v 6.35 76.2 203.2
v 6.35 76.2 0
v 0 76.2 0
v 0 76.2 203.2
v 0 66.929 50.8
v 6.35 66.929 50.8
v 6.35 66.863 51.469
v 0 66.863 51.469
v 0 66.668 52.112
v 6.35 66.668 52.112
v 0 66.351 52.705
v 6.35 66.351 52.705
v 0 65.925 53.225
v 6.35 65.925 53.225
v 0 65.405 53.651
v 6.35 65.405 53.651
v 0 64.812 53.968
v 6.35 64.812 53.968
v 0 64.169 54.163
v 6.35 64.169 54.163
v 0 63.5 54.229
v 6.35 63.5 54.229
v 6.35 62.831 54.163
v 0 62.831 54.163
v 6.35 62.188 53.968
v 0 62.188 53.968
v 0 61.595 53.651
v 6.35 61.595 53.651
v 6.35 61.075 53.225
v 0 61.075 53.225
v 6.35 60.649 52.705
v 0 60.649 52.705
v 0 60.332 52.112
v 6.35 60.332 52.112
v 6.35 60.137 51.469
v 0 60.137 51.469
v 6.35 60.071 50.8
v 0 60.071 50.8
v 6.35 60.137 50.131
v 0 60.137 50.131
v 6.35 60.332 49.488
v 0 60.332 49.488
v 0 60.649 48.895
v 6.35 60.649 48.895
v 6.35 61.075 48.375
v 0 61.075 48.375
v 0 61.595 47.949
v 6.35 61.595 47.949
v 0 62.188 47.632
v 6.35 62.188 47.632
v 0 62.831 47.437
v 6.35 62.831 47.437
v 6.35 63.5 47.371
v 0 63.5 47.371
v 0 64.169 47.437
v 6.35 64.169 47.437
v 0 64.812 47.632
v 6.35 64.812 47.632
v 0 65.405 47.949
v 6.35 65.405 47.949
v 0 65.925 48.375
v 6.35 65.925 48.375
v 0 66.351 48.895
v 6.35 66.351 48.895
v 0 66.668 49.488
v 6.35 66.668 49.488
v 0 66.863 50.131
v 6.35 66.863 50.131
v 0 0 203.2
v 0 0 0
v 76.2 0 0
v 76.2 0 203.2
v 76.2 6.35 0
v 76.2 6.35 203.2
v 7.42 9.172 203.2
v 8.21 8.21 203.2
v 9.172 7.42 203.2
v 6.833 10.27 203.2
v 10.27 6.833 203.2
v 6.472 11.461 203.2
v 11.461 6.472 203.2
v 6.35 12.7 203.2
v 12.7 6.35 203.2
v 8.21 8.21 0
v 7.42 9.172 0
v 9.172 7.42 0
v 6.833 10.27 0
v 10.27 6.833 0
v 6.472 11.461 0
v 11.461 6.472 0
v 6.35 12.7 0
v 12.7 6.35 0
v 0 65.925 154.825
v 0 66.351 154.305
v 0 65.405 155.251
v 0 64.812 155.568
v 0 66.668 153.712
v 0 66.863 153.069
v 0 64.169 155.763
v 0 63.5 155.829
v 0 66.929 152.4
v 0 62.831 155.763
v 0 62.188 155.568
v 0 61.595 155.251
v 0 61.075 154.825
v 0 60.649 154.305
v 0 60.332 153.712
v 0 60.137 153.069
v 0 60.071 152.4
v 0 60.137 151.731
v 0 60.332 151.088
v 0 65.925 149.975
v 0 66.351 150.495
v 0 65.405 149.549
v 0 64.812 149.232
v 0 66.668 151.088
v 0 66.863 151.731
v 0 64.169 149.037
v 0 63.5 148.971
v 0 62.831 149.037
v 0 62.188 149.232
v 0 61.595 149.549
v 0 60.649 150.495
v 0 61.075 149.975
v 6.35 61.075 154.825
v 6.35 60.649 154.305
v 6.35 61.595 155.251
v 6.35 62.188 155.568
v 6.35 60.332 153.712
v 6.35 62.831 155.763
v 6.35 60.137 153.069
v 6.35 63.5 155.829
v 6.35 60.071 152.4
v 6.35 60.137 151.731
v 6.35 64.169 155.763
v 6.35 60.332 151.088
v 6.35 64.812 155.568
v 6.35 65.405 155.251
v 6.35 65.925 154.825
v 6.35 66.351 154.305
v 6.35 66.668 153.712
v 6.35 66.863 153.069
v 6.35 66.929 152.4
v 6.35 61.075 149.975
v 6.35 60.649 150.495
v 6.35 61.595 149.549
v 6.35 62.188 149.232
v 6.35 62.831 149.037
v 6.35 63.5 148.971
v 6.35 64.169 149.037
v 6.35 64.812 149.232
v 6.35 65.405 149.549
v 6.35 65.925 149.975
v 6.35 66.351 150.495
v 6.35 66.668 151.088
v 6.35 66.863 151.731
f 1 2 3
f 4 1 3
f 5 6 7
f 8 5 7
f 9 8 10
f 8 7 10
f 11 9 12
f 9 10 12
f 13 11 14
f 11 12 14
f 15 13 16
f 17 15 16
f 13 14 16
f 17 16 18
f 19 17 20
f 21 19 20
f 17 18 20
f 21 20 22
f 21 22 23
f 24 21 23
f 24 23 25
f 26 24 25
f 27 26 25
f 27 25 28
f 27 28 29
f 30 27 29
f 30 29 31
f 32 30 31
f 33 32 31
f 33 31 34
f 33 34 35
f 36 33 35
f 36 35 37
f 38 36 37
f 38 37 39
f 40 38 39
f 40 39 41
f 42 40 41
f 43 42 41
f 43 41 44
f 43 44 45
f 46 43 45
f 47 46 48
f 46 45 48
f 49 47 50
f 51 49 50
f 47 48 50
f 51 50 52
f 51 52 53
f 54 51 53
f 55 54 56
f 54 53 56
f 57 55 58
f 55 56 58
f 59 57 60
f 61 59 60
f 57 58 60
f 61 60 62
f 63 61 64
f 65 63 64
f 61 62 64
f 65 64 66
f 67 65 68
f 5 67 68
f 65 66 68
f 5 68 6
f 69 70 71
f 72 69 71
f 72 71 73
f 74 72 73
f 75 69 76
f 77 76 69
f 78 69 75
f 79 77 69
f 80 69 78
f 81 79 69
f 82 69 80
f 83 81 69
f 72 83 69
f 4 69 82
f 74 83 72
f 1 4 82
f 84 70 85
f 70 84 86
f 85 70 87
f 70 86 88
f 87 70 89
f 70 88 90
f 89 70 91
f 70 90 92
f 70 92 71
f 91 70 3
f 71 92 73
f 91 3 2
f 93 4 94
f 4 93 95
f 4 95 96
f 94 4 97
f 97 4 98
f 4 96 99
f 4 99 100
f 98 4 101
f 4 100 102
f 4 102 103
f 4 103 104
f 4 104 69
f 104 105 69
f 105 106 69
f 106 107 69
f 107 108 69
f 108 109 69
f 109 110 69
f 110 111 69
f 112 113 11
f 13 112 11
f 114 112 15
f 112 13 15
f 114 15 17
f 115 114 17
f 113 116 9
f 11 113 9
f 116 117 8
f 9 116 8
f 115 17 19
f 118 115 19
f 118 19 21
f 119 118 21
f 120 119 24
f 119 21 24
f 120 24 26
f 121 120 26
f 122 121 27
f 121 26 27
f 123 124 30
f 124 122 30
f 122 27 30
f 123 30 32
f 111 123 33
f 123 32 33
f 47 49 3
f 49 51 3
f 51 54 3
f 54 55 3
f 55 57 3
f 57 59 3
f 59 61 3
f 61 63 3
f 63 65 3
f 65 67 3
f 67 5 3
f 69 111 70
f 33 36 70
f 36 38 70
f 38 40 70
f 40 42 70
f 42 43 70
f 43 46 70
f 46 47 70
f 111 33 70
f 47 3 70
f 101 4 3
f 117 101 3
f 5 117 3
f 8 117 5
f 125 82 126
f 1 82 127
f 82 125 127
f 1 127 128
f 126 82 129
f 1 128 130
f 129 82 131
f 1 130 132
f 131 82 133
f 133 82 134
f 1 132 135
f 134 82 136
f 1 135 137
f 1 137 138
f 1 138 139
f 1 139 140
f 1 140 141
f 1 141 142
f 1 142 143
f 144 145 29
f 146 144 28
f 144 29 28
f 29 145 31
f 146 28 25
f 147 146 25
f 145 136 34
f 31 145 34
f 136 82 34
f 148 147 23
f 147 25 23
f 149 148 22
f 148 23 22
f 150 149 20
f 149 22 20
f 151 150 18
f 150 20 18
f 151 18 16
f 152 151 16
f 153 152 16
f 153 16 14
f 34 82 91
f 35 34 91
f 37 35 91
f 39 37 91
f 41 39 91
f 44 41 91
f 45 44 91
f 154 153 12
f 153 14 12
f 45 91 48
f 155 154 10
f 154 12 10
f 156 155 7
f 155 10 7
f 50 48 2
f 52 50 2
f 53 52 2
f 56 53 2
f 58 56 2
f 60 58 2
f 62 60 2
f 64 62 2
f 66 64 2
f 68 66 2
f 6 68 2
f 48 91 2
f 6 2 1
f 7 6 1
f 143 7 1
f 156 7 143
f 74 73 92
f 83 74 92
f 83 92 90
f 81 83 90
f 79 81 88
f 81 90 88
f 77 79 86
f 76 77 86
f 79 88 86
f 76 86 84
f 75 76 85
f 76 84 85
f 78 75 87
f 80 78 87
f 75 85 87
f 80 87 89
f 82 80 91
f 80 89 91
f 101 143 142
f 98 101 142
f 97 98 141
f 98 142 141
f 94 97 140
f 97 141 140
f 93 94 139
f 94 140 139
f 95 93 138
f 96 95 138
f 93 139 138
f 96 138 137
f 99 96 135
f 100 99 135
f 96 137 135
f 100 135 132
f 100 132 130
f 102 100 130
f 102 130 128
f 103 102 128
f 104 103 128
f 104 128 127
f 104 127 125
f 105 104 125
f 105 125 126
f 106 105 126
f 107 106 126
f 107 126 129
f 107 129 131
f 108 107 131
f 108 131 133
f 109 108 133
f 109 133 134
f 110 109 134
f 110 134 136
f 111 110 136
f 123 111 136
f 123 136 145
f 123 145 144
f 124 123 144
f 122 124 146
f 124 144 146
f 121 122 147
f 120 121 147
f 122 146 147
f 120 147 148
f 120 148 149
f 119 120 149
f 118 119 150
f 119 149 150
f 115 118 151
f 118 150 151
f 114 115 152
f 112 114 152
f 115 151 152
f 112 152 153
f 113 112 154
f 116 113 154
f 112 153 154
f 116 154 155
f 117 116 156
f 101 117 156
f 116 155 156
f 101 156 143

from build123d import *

# Parameters (mm, degrees)
BOSS_EXTRUDE1_DEPTH = 203.2
SKETCH2_R           = 3.429
CUT_EXTRUDE1_DEPTH  = 228.981803002


with BuildPart() as part:
    # Sketch1 → Boss-Extrude1 (new body)
    with BuildSketch(Plane.XY):
        with BuildLine():
            Line((0, 0), (76.2, 0))
            Line((76.2, 0), (76.2, 6.35))
            Line((76.2, 6.35), (12.7, 6.35))
            ThreePointArc((12.7, 6.35), (8.209871939, 8.209871939), (6.35, 12.7))
            Line((6.35, 12.7), (6.35, 76.2))
            Line((6.35, 76.2), (0, 76.2))
            Line((0, 76.2), (0, 0))
        make_face()
    extrude(amount=BOSS_EXTRUDE1_DEPTH)

    # Sketch2 → Cut-Extrude1 (cut, through all)
    with BuildSketch(Plane(origin=(6.35, 0, 0), x_dir=(0, 0, -1), z_dir=(1, 0, 0))):
        with Locations(Location((-50.8, 63.5, 0), (0, 0, 90))):
            Circle(SKETCH2_R)
        with Locations(Location((-152.4, 63.5, 0), (0, 0, 90))):
            Circle(SKETCH2_R)
    extrude(amount=-CUT_EXTRUDE1_DEPTH, mode=Mode.SUBTRACT)


solid = part.part
